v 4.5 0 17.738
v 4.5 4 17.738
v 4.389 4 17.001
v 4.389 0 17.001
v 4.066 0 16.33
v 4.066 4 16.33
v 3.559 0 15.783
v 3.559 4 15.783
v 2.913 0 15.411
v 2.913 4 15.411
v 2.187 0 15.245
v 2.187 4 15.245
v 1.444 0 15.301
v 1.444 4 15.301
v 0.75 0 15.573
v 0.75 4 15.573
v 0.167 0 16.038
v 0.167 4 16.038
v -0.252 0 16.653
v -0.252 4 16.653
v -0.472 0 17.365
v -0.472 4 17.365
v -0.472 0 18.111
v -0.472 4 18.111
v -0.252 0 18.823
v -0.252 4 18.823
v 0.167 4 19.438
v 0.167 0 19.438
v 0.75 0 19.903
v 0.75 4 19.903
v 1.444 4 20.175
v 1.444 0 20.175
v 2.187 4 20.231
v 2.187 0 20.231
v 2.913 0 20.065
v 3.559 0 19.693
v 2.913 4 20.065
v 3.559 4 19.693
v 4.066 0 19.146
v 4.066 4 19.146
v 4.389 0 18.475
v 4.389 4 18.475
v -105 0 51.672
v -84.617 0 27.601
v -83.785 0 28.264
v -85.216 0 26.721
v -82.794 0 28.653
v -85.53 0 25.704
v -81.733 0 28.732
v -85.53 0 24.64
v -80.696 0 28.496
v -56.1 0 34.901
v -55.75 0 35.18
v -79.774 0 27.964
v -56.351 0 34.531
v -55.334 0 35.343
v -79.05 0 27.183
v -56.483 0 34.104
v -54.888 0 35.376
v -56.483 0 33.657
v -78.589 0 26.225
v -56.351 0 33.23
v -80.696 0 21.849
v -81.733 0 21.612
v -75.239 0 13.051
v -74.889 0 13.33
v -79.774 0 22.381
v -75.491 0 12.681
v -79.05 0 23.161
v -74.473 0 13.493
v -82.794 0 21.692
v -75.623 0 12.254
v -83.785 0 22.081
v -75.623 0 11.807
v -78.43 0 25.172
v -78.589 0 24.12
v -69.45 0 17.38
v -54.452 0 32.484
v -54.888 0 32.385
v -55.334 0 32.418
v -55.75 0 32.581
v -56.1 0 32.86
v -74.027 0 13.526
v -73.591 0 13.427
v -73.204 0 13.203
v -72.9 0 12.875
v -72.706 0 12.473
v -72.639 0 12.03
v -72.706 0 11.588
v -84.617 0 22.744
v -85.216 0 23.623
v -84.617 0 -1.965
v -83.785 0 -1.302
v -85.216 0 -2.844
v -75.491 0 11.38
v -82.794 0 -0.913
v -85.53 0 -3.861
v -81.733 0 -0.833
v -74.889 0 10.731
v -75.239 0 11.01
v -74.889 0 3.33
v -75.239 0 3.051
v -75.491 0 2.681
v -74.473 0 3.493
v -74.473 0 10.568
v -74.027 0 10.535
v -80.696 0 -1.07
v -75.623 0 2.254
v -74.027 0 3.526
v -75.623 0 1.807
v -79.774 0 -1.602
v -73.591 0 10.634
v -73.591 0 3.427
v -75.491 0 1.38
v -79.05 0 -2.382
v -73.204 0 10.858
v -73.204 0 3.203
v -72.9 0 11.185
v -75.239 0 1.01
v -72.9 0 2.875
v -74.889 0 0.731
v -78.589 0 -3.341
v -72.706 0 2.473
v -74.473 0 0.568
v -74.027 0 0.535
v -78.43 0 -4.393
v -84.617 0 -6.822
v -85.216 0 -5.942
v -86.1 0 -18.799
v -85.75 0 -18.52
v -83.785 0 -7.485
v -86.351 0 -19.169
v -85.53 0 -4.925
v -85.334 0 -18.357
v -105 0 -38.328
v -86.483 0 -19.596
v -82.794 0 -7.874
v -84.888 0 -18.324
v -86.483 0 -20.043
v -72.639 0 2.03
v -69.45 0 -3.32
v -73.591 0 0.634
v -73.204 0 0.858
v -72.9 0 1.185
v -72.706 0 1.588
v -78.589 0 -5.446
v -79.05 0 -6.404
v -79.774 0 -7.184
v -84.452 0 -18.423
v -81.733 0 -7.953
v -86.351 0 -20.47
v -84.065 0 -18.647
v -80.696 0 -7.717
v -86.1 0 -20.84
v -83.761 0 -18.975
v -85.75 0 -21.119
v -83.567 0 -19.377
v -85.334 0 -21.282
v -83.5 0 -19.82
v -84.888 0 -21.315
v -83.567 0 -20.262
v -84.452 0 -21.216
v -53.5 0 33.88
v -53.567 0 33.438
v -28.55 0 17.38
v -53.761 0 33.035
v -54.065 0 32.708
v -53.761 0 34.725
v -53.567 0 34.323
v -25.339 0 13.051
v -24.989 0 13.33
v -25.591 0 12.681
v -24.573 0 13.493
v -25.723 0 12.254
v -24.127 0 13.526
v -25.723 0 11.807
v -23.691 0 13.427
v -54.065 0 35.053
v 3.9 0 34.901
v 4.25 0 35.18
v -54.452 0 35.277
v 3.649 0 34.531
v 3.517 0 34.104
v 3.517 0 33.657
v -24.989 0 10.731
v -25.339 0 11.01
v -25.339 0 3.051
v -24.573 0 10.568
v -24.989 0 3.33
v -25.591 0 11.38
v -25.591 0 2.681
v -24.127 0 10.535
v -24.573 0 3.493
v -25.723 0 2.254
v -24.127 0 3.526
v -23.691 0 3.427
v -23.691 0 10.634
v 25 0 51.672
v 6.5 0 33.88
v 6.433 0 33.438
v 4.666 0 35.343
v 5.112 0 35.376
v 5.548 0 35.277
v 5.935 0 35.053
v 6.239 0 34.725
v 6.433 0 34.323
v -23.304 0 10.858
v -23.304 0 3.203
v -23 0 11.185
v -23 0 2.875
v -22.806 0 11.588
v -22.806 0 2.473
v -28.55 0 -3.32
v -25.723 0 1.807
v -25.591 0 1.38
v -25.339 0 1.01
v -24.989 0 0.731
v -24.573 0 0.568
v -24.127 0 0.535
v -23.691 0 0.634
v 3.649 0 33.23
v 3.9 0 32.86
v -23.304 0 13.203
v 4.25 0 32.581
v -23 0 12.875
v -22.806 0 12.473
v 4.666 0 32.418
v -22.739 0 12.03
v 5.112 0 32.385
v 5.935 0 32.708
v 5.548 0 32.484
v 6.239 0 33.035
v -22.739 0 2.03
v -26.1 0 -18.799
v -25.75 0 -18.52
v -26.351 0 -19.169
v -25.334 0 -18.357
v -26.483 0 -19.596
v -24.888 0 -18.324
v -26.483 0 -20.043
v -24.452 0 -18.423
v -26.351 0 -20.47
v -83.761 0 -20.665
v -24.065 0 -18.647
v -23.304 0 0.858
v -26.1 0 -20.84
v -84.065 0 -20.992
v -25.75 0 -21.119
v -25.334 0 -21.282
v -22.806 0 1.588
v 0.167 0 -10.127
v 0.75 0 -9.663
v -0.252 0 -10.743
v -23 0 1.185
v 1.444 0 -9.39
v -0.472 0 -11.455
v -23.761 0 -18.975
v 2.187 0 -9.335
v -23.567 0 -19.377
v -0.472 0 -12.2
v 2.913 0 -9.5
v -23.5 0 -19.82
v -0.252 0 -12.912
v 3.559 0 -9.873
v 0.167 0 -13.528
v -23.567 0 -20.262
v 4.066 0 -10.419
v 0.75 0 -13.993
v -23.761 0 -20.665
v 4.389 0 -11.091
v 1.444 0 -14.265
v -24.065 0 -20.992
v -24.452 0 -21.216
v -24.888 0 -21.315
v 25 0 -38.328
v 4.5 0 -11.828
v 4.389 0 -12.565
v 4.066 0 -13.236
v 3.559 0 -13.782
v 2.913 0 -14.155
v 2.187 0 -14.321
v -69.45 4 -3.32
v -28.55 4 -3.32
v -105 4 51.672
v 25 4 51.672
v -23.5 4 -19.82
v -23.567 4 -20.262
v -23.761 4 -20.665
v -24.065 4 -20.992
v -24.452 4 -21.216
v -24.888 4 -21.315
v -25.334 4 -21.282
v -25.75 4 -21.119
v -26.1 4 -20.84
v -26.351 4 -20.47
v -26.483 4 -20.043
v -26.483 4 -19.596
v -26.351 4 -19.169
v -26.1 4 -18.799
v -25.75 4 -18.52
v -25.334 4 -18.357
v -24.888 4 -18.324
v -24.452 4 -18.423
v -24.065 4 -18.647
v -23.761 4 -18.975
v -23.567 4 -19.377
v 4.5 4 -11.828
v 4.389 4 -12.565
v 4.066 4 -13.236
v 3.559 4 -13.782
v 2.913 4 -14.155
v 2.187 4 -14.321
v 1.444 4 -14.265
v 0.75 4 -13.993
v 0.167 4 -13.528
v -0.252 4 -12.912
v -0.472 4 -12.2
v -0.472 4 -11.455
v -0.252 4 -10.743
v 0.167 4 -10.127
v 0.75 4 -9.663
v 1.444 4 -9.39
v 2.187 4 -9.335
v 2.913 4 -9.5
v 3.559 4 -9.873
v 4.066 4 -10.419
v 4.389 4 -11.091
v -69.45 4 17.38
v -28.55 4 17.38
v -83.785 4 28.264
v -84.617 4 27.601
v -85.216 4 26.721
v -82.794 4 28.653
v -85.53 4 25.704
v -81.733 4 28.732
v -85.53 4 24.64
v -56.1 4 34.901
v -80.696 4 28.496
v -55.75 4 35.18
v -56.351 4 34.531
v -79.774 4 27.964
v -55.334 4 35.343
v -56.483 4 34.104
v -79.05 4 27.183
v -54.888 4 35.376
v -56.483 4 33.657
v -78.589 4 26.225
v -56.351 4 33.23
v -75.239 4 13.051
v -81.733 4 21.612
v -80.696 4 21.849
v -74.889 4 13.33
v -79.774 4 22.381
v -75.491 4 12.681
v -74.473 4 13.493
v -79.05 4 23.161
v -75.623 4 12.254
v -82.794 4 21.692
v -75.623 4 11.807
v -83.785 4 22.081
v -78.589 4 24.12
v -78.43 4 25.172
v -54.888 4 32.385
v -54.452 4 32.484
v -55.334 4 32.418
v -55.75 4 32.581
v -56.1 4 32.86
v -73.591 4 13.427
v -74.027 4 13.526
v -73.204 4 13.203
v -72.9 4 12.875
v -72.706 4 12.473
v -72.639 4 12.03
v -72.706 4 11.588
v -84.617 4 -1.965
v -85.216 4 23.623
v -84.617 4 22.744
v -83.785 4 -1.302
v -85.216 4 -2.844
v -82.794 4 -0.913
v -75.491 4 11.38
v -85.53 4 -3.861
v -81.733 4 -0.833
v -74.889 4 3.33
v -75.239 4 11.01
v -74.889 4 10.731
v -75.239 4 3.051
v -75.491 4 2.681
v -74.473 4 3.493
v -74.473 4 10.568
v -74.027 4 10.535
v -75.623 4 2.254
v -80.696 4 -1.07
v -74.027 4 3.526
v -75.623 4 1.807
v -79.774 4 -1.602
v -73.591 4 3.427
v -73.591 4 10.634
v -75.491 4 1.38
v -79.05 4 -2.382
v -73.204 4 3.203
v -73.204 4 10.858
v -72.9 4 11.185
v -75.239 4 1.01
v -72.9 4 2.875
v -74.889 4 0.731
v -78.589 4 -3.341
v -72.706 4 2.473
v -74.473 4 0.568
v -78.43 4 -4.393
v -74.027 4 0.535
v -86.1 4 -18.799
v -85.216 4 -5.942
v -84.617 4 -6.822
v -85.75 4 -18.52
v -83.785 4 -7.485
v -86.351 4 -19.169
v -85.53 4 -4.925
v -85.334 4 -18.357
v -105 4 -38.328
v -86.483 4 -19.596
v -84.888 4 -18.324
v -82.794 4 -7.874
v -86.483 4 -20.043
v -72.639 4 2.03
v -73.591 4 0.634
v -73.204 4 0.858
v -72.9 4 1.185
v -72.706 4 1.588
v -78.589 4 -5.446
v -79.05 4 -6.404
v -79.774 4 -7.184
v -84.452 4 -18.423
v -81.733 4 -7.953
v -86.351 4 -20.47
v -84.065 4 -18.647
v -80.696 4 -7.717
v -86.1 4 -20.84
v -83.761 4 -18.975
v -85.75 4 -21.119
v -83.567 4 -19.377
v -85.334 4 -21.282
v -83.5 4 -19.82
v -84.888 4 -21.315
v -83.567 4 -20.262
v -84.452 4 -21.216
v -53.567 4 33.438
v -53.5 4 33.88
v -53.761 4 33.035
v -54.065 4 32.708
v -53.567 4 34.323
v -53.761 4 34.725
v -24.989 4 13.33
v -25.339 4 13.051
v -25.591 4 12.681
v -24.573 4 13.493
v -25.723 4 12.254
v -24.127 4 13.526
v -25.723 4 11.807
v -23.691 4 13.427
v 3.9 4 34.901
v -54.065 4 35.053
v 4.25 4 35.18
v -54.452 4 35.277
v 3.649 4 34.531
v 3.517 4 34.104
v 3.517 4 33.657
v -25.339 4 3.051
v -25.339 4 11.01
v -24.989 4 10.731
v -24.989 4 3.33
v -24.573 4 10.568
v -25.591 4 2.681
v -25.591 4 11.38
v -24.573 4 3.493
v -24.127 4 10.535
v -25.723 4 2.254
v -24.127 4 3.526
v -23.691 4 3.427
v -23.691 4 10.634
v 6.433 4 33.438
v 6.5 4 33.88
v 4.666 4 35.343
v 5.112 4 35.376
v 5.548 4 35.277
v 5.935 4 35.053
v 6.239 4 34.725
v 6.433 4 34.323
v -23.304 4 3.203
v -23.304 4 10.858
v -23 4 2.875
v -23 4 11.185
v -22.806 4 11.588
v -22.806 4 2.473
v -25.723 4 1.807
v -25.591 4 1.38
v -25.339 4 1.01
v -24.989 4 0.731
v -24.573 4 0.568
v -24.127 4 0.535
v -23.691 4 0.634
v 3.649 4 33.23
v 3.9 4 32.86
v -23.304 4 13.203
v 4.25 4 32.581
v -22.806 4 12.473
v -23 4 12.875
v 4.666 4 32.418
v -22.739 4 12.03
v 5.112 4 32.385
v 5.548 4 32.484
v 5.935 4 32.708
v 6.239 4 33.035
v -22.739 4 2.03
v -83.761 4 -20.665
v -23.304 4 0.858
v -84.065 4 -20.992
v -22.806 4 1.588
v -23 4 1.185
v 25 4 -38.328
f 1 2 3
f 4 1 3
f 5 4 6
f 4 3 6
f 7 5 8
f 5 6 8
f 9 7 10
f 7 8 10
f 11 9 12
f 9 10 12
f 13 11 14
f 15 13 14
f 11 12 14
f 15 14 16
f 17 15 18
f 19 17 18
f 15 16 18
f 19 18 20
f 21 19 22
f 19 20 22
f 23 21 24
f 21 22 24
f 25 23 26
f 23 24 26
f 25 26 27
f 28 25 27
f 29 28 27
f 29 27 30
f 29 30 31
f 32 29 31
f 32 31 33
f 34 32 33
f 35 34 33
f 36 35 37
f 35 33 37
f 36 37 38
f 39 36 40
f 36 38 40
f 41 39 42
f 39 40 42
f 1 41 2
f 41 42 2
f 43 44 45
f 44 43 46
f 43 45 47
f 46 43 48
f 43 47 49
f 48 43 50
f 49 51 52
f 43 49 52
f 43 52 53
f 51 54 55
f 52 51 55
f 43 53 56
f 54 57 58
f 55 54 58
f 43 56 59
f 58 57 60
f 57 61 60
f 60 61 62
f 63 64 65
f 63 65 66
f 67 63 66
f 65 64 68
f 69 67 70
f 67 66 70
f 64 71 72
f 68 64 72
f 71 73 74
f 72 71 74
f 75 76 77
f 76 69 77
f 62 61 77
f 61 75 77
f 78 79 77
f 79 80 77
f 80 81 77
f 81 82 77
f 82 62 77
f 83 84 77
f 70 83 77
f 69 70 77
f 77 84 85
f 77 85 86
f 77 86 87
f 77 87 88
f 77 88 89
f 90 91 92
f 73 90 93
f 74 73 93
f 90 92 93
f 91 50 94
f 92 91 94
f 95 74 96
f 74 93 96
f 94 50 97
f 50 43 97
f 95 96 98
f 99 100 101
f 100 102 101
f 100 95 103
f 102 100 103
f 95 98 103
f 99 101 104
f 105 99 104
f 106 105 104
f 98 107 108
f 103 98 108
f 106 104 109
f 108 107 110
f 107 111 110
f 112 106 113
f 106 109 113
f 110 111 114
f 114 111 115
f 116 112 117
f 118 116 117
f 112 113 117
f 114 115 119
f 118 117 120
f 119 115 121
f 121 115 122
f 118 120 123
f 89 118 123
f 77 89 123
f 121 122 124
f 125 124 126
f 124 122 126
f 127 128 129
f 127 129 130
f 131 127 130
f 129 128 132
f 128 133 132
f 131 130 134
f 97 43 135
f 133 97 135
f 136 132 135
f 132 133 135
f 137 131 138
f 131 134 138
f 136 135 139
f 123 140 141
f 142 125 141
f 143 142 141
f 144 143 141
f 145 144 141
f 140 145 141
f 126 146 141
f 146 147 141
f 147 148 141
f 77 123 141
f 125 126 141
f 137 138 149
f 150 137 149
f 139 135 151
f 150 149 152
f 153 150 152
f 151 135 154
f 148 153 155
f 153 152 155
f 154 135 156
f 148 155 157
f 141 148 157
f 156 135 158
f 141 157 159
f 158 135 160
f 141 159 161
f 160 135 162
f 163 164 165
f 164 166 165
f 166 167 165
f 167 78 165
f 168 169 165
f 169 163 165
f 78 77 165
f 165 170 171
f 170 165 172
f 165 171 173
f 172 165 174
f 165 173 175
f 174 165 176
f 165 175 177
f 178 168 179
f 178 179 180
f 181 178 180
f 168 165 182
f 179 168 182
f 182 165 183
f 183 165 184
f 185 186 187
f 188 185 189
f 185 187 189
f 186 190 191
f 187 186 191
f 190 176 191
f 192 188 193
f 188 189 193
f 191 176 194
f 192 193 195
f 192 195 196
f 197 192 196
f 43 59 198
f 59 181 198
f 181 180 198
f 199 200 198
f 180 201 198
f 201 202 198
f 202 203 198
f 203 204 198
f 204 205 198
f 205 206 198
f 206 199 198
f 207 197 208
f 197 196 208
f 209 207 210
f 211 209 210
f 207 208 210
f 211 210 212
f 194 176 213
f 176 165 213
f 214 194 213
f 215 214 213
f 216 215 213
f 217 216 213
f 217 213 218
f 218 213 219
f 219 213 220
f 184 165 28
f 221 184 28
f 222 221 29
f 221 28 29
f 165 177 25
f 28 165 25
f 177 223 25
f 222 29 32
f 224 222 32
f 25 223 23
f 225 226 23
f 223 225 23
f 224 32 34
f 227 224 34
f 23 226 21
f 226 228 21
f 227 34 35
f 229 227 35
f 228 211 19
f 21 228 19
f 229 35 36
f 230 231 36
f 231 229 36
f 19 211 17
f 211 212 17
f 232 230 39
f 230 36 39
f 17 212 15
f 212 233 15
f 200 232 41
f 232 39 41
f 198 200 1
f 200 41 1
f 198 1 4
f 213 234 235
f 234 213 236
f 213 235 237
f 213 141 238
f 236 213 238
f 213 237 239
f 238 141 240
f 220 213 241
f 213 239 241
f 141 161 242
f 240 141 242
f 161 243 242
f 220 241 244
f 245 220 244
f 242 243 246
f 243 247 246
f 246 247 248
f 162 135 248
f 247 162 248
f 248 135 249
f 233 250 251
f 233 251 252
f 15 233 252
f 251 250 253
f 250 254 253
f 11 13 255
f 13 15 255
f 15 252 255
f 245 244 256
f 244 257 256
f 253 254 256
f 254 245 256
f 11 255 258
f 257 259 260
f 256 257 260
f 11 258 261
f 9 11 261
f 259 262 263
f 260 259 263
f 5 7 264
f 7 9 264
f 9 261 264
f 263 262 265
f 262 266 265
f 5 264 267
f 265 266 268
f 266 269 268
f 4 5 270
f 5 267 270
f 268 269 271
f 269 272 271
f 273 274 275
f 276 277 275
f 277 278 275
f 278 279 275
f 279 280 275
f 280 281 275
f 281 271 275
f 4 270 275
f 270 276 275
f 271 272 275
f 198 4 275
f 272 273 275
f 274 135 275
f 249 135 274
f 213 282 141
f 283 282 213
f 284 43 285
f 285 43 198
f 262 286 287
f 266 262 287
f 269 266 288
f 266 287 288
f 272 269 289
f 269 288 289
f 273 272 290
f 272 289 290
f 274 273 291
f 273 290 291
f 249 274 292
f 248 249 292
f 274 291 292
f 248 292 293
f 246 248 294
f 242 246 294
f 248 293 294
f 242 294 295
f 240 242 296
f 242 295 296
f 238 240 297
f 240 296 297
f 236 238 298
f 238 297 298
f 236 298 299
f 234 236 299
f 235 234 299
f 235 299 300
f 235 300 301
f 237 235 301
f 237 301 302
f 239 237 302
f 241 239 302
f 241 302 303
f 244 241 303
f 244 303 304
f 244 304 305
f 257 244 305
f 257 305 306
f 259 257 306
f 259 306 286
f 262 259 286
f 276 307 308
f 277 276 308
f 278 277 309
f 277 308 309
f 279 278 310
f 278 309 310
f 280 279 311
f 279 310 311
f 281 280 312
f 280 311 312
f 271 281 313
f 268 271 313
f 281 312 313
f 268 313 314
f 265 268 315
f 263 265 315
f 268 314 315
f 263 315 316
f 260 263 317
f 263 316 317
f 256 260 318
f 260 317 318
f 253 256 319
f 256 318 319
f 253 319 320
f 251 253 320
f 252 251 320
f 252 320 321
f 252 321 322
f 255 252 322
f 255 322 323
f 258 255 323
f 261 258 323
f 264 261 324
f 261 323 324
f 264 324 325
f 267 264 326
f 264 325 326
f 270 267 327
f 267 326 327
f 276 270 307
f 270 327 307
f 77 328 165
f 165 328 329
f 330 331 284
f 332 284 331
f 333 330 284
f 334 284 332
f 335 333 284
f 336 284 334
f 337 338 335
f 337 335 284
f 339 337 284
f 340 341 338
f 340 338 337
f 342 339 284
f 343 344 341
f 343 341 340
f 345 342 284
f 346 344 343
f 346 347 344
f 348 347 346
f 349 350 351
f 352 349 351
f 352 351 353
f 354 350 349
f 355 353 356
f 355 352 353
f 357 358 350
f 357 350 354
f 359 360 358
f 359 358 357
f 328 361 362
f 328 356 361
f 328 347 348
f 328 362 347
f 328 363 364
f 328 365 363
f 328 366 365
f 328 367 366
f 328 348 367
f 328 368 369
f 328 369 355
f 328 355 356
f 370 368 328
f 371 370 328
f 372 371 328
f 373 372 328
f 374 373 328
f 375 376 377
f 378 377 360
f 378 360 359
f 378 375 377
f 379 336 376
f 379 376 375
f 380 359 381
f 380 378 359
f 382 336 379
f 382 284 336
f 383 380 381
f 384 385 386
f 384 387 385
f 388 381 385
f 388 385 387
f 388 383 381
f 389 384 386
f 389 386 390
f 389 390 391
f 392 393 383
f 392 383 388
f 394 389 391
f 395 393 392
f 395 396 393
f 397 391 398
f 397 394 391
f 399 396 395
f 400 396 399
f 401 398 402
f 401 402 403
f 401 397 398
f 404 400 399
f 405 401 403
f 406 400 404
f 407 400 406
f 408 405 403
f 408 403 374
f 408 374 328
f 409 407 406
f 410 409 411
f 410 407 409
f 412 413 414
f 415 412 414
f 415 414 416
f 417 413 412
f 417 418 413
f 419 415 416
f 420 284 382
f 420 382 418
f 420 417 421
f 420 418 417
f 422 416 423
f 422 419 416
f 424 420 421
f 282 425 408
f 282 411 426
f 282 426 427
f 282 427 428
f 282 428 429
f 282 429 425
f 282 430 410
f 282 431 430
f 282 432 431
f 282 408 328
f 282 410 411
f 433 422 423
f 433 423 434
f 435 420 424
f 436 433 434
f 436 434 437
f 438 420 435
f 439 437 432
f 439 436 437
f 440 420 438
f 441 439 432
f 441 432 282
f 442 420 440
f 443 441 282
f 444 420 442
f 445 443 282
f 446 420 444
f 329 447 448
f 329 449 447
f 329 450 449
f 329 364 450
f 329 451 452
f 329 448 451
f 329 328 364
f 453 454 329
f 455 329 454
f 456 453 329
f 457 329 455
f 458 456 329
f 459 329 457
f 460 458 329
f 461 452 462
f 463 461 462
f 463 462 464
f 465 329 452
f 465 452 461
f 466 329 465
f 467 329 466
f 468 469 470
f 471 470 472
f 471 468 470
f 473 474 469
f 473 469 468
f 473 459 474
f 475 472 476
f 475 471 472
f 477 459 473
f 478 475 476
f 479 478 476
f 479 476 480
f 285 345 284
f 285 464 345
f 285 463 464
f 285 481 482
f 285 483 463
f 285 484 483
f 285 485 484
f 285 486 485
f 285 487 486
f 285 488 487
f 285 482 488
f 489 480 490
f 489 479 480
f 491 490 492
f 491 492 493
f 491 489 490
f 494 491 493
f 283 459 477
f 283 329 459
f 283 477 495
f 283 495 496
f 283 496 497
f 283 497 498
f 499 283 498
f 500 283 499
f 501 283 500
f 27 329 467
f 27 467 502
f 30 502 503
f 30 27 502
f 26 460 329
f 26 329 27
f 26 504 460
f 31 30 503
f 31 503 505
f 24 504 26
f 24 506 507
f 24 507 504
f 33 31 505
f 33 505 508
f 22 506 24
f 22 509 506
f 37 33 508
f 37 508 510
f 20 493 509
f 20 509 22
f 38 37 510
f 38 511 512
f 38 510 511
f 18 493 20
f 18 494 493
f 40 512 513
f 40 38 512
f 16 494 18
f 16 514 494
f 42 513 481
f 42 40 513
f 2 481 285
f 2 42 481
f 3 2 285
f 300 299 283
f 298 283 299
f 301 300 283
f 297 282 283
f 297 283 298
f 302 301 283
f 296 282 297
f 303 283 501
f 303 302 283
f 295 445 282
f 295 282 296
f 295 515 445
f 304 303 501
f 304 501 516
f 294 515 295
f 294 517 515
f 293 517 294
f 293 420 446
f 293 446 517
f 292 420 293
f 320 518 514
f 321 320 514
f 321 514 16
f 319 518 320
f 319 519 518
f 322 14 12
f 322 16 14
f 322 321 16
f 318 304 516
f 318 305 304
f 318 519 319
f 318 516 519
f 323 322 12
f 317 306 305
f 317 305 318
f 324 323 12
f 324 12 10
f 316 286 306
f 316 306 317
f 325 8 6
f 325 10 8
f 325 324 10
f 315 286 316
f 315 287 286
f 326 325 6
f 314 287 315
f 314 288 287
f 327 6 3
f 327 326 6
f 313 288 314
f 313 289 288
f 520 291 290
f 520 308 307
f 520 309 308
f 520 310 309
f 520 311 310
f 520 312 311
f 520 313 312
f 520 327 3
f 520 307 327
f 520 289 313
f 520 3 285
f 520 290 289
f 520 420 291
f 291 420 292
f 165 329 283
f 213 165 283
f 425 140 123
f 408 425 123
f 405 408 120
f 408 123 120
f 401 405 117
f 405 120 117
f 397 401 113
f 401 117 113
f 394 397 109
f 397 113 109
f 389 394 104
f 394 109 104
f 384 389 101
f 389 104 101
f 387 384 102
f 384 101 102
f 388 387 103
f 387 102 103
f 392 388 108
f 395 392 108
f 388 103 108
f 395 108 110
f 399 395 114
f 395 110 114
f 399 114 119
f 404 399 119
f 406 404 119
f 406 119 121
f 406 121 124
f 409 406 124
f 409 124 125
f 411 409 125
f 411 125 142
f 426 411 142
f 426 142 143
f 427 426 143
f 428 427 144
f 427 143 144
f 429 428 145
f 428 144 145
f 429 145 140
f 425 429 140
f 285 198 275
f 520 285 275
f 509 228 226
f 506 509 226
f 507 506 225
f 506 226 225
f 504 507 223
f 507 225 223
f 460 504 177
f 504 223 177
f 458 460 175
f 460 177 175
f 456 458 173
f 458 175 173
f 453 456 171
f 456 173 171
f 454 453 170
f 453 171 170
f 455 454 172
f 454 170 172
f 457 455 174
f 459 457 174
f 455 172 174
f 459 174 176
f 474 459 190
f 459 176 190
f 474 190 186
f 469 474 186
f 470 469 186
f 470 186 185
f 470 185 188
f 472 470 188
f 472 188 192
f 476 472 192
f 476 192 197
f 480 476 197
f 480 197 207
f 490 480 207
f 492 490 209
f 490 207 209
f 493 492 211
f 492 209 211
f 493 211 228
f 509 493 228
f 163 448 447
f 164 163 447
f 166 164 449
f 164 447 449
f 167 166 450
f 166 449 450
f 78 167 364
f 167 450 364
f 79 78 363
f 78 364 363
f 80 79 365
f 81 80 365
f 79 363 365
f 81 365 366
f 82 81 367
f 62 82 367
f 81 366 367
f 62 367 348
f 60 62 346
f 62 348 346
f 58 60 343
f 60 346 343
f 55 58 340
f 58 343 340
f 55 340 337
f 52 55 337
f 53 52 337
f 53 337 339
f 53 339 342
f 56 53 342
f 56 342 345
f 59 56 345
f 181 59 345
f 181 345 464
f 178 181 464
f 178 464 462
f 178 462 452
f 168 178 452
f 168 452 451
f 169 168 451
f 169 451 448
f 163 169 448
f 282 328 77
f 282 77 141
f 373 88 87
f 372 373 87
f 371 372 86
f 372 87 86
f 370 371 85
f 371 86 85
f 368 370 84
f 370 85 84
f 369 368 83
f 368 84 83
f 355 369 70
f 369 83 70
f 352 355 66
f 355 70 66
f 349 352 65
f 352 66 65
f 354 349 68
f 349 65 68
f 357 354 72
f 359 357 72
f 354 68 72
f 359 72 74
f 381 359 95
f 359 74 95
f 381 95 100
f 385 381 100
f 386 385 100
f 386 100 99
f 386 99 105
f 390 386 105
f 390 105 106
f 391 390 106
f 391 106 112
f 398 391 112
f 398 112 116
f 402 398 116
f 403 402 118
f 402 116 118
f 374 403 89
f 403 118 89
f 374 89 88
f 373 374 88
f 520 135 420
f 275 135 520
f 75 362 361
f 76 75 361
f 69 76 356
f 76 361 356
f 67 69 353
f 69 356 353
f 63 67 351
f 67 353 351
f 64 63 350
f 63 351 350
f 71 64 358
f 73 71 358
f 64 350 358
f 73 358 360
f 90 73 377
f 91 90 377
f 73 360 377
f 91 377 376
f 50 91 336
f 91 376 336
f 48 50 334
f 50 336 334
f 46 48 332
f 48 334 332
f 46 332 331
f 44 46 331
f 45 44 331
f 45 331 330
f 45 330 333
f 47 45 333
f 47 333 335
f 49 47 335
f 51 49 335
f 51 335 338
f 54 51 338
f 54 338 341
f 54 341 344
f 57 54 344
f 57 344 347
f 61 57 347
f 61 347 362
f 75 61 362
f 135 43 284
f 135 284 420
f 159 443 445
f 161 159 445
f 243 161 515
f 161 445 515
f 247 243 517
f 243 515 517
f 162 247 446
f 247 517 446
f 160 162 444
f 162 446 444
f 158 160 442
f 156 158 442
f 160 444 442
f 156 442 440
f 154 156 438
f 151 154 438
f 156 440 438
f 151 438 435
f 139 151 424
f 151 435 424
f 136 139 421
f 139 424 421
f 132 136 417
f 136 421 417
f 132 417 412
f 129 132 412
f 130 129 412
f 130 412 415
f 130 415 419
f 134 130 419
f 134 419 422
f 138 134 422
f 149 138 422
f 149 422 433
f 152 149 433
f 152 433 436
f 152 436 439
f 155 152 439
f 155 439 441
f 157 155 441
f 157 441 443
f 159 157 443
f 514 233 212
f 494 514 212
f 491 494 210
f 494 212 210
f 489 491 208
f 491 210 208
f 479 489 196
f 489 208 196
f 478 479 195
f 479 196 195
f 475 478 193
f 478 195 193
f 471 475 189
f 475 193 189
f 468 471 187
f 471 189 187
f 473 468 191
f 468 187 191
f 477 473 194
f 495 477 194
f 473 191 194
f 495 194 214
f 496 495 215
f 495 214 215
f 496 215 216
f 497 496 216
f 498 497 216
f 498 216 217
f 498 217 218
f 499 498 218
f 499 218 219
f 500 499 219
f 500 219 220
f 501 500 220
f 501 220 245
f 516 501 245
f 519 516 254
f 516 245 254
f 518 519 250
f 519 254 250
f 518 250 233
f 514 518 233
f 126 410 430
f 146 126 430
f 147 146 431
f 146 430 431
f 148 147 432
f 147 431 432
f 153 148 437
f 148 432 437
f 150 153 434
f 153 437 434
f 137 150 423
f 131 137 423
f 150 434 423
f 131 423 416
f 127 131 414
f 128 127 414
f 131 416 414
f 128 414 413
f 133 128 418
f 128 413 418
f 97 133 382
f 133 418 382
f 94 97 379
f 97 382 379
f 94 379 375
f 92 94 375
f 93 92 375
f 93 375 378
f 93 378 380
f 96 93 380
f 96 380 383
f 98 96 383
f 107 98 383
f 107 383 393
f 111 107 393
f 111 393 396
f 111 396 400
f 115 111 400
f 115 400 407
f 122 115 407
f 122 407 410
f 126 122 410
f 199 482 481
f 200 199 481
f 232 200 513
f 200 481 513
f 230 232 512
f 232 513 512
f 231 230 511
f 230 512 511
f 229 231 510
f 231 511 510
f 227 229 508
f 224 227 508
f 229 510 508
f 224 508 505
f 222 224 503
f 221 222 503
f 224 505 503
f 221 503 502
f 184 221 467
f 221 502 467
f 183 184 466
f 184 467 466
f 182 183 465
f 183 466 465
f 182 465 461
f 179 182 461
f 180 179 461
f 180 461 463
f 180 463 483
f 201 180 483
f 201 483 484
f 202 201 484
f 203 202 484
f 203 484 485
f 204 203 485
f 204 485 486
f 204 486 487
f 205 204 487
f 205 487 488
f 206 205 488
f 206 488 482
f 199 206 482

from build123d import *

# Parameters (mm, degrees)
SKETCH1_W           = 130
SKETCH1_H           = 90
BOSS_EXTRUDE1_DEPTH = 4
SKETCH7_R           = 3.65
SKETCH7_R_2         = 3.57
CUT_EXTRUDE5_DEPTH  = 10
SKETCH15_W          = 40.9
SKETCH15_H          = 20.7
CUT_EXTRUDE10_DEPTH = 5
SKETCH6_R           = 1.5
CUT_EXTRUDE4_DEPTH  = 4
SKETCH12_R          = 1.5
CUT_EXTRUDE8_DEPTH  = 5
SKETCH14_W          = 15.685038152
SKETCH14_H          = 44.965808151
SKETCH14_R          = 2.5
BOSS_EXTRUDE2_DEPTH = 4


with BuildPart() as part:
    # Sketch1 → Boss-Extrude1 (new body)
    with BuildSketch(Plane(origin=(0, 0, 0), x_dir=(1, 0, 0), z_dir=(0, 1, 0))):
        with Locations((-40, -6.672366697)):
            Rectangle(SKETCH1_W, SKETCH1_H)
    extrude(amount=BOSS_EXTRUDE1_DEPTH)

    # Sketch7 → Cut-Extrude5 (cut)
    with BuildSketch(Plane(origin=(0, 4, 0), x_dir=(1, 0, 0), z_dir=(0, 1, 0))):
        with Locations((2, 11.827633303)):
            Circle(SKETCH7_R)
        with Locations((2, -17.738049342)):
            Circle(SKETCH7_R)
        with Locations((-82, 4.393315947)):
            Circle(SKETCH7_R_2)
        with Locations((-82, -25.172366697)):
            Circle(SKETCH7_R_2)
    extrude(amount=-CUT_EXTRUDE5_DEPTH, mode=Mode.SUBTRACT)

    # Sketch15 → Cut-Extrude10 (cut, through all)
    with BuildSketch(Plane(origin=(0, 4, 0), x_dir=(1, 0, 0), z_dir=(0, 1, 0))):
        with Locations((-49, -7.030465848)):
            Rectangle(SKETCH15_W, SKETCH15_H)
    extrude(amount=-CUT_EXTRUDE10_DEPTH, mode=Mode.SUBTRACT)

    # Sketch6 → Cut-Extrude4 (cut)
    with BuildSketch(Plane.XZ):
        with Locations((-74.139435372, 12.030465848)):
            Circle(SKETCH6_R)
        with Locations((-24.239435372, 12.030465848)):
            Circle(SKETCH6_R)
        with Locations((-74.139435372, 2.030465848)):
            Circle(SKETCH6_R)
        with Locations((-24.239435372, 2.030465848)):
            Circle(SKETCH6_R)
    extrude(amount=-CUT_EXTRUDE4_DEPTH, mode=Mode.SUBTRACT)

    # Sketch12 → Cut-Extrude8 (cut, through all)
    with BuildSketch(Plane(origin=(0, 4, 0), x_dir=(1, 0, 0), z_dir=(0, 1, 0))):
        with Locations((-85, 19.819534152)):
            Circle(SKETCH12_R)
        with Locations((-25, 19.819534152)):
            Circle(SKETCH12_R)
        with Locations((-55, -33.880465848)):
            Circle(SKETCH12_R)
        with Locations((5, -33.880465848)):
            Circle(SKETCH12_R)
    extrude(amount=-CUT_EXTRUDE8_DEPTH, mode=Mode.SUBTRACT)

    # Sketch14 → Boss-Extrude2 (add, through all)
    with BuildSketch(Plane(origin=(0, 4, 0), x_dir=(1, 0, 0), z_dir=(0, 1, 0))):
        with Locations((2, -2.95520802)):
            Rectangle(SKETCH14_W, SKETCH14_H)
        with Locations((2, 11.827633303)):
            Circle(SKETCH14_R, mode=Mode.SUBTRACT)
        with Locations((2, -17.738049342)):
            Circle(SKETCH14_R, mode=Mode.SUBTRACT)
    extrude(amount=-BOSS_EXTRUDE2_DEPTH)


solid = part.part
